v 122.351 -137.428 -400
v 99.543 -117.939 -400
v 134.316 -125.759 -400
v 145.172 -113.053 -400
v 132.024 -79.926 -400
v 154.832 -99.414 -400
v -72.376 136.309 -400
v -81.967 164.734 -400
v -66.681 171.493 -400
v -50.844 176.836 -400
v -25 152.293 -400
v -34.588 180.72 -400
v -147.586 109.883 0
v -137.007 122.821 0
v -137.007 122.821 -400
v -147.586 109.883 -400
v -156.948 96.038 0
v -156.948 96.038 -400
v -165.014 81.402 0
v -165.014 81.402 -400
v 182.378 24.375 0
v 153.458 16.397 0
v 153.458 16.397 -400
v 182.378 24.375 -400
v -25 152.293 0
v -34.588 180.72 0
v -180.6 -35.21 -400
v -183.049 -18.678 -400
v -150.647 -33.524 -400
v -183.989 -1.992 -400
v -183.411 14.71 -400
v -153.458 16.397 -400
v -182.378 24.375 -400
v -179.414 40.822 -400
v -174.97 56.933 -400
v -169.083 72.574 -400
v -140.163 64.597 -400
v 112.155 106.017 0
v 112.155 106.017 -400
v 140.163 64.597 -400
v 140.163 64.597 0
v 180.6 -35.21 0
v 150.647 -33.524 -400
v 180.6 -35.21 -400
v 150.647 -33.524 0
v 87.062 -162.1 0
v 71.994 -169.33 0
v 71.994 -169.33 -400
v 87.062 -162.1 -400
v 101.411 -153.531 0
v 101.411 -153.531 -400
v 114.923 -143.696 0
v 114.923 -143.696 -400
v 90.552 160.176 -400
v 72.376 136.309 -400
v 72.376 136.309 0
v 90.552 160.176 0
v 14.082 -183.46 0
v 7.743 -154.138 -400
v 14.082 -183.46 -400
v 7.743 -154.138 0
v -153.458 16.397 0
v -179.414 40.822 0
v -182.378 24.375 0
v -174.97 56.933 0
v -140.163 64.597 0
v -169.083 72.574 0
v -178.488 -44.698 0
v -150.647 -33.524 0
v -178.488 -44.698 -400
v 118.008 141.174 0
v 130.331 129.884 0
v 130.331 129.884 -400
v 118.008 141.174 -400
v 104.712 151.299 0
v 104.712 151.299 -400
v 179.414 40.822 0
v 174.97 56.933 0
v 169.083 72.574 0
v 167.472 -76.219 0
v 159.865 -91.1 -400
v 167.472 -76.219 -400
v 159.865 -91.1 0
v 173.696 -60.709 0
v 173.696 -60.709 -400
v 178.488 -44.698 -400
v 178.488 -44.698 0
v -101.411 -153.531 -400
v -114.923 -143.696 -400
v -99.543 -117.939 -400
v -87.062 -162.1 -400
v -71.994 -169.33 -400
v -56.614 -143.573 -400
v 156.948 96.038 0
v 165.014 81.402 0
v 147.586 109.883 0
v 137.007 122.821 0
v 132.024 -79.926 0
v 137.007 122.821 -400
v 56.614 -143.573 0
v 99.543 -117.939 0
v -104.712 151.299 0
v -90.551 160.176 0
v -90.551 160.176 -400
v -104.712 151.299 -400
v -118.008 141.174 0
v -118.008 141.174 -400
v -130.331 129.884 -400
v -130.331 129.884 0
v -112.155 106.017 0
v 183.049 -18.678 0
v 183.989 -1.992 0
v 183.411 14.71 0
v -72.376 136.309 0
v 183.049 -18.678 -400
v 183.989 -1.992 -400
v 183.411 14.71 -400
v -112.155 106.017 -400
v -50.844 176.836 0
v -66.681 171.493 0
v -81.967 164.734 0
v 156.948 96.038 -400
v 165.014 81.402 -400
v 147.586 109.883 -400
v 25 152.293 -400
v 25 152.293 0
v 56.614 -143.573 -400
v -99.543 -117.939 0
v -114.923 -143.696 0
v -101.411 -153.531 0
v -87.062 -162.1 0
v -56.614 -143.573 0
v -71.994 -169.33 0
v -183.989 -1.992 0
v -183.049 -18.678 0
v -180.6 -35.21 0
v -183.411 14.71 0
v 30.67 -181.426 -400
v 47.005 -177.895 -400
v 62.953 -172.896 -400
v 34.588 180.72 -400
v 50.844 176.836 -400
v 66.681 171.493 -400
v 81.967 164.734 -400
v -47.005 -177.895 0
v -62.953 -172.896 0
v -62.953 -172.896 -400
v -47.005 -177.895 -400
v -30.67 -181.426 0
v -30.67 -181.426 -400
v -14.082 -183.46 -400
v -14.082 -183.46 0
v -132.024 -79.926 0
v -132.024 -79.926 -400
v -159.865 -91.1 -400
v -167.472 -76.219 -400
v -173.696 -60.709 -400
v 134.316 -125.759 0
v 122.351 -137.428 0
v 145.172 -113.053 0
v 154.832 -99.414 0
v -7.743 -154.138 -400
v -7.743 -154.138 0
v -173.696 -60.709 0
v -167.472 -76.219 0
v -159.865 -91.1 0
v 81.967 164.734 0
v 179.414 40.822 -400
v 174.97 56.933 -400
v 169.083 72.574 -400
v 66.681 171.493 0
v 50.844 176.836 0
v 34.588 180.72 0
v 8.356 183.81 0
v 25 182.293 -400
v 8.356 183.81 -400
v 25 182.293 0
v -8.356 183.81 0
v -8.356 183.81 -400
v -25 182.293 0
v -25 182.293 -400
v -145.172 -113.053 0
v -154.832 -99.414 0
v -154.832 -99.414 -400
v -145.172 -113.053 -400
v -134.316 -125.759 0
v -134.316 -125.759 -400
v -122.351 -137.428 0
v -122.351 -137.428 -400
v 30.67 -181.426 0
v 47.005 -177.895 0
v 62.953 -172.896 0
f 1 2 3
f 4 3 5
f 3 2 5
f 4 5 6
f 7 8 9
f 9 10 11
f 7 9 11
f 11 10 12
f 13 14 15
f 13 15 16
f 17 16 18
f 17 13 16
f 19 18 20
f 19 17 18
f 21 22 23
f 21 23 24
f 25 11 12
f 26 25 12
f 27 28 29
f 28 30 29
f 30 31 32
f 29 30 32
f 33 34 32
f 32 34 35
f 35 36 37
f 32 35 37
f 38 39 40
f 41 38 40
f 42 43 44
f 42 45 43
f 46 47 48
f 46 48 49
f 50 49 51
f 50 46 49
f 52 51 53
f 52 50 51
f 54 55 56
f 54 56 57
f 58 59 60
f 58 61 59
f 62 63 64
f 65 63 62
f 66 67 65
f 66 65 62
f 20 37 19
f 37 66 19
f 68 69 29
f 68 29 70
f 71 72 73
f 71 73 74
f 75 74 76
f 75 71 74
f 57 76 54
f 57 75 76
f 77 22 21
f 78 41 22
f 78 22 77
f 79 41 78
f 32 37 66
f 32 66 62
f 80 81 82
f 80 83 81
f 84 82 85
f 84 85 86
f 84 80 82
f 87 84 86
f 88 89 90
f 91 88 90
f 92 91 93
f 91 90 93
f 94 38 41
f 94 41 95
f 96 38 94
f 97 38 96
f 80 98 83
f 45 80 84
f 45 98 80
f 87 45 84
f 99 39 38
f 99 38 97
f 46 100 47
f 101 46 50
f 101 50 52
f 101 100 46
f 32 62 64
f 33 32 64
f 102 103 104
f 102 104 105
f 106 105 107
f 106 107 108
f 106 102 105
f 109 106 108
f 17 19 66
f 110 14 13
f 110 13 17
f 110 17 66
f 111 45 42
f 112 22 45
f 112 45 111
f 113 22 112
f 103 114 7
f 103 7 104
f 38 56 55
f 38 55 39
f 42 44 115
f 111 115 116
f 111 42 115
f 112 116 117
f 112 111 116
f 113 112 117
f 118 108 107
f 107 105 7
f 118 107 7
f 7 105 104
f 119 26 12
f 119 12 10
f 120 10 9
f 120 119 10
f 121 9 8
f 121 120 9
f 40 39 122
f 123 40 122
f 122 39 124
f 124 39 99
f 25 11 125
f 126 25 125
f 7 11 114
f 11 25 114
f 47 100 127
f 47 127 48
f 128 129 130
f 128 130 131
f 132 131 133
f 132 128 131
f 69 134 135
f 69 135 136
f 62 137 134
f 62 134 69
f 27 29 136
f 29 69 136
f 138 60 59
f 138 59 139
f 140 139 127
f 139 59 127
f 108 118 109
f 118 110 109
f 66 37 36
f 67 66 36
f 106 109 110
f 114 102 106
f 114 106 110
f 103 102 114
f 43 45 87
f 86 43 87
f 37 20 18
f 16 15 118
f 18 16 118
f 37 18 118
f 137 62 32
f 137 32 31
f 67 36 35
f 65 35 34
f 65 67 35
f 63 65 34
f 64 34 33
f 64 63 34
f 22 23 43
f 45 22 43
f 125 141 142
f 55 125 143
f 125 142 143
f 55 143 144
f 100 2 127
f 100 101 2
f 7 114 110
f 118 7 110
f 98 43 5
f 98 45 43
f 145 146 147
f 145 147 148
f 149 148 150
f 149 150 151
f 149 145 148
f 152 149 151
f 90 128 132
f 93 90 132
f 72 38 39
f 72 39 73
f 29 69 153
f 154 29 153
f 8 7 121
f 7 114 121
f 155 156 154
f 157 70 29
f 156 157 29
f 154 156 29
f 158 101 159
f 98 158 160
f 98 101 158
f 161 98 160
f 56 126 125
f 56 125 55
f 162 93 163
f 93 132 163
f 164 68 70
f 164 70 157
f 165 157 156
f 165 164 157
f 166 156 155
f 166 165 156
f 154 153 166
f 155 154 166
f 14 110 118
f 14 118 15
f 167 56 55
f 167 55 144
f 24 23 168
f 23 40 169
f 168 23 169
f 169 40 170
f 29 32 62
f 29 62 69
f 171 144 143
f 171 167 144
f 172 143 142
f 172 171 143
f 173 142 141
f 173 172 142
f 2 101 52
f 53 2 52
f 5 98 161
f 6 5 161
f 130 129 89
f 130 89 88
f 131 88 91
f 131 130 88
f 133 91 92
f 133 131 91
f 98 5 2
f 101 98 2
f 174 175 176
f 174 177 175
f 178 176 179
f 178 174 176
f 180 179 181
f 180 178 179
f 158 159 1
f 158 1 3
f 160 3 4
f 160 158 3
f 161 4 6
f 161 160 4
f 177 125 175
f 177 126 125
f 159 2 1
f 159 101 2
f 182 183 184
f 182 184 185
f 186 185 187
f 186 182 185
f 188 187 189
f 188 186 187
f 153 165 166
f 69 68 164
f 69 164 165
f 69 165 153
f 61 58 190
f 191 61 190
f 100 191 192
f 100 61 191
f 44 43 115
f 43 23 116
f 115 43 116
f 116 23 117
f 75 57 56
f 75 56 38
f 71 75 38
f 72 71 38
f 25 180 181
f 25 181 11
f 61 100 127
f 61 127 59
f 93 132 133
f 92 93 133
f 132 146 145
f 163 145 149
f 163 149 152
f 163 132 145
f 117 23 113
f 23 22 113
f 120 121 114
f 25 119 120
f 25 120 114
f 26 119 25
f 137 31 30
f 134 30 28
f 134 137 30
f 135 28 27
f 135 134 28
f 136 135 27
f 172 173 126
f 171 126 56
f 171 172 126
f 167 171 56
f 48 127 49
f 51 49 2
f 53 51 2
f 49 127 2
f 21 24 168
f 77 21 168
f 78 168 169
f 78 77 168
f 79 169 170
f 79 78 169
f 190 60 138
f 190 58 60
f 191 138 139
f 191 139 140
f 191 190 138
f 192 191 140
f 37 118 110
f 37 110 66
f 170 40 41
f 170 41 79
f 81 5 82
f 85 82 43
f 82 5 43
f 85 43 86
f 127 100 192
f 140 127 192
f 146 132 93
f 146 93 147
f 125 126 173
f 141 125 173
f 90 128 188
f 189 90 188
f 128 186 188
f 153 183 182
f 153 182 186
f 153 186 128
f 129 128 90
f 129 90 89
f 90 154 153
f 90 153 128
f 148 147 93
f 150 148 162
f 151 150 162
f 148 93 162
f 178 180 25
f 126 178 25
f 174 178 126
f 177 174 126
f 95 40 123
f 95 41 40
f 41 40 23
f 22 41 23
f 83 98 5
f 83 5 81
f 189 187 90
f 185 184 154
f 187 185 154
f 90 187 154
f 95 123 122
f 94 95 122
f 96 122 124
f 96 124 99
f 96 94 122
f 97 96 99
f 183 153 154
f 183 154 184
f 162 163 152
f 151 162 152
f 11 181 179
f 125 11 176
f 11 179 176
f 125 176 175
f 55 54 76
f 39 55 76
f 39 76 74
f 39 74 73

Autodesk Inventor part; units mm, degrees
ref_plane "YZ Plane" through (0, 0, 0) normal (1, 0, 0) x (0, 1, 0)
ref_plane "XZ Plane" through (0, 0, 0) normal (0, 1, 0) x (-1, 0, 0)
ref_plane "XY Plane" through (0, 0, 0) normal (0, 0, 1) x (1, 0, 0)
sketch "Skizze1" plane through (0, 0, 0) normal (0, 0, 1) x (1, 0, 0)
  line L0 (-257.6, 0) -> (257.6, 0) projected
  line L1 (0, -257.6) -> (0, 257.6) projected
  circle A0 centre (0, 0) radius 184
  line L2 (-25, 182.2933) -> (-25, 152.2933)
  line L3 (-25, 152.2933) -> (25, 152.2933)
  line L4 (25, 152.2933) -> (25, 182.2933)
  arc A1 (25, 182.2933) -> (-25, 182.2933) centre (0, 0.0397) ccw
  dimension "d11" = 368
  dimension "d13" = 25
  dimension "d15" = 50
extrude "Extrusion1" add sketch "Skizze1" against normal blind 400 contours A0 L1 L3 L2 | L1 A0 L4 L3
sketch "Skizze2" plane through (0, 0, 0) normal (0, 0, 1) x (1, 0, 0)
  circle A0 centre (0, 0) radius 184
  arc A1 (25, 182.2933) -> (-25, 182.2933) centre (0, 0.0397) ccw projected
  line L0 (-25, 152.2933) -> (-25, 182.2933) projected
  arc A2 (25, 182.2933) -> (-25, 182.2933) centre (0, 0.0397) ccw
  line L1 (-25, 182.2933) -> (-25, 152.2933)
  line L2 (25, 152.2933) -> (-25, 152.2933) projected
  line L3 (25, 152.2933) -> (25, 182.2933)
  line L4 (-25, 152.2933) -> (-72.3761, 136.3088)
  line L5 (-72.3761, 136.3088) -> (-81.9668, 164.7345)
  line L6 (-25, 152.2933) -> (-34.5884, 180.7198)
  line L7 (25, 152.2933) -> (72.3761, 136.3088)
  line L8 (72.3761, 136.3088) -> (81.9668, 164.7345)
  line L9 (25, 152.2933) -> (34.5884, 180.7198)
  line L10 (72.3761, 136.3088) -> (112.1554, 106.0167)
  line L11 (112.1554, 106.0167) -> (130.3306, 129.8843)
  line L12 (72.3761, 136.3088) -> (90.5515, 160.1762)
  line L13 (-72.3761, 136.3088) -> (-112.1554, 106.0167)
  line L14 (-112.1554, 106.0167) -> (-130.3306, 129.8843)
  line L15 (-72.3761, 136.3088) -> (-90.5513, 160.1763)
  line L16 (-257.6, 0) -> (257.6, 0) projected
  line L17 (0, -257.6) -> (0, 257.6) projected
  line L18 (-112.1554, 106.0167) -> (-140.1627, 64.5971)
  line L19 (-140.1627, 64.5971) -> (-165.0145, 81.4015)
  line L20 (-112.1554, 106.0167) -> (-137.0072, 122.8212)
  line L21 (-140.1627, 64.5971) -> (-153.4585, 16.3973)
  line L22 (-153.4585, 16.3973) -> (-182.3784, 24.3747)
  line L23 (-140.1627, 64.5971) -> (-169.0826, 72.5745)
  line L24 (-153.4585, 16.3973) -> (-150.6471, -33.5236)
  line L25 (-150.6471, -33.5236) -> (-180.5996, -35.2105)
  line L26 (-153.4585, 16.3973) -> (-183.411, 14.7104)
  line L27 (-150.6471, -33.5236) -> (-132.0236, -79.9259)
  line L28 (-132.0236, -79.9259) -> (-159.8649, -91.0999)
  line L29 (-150.6471, -33.5236) -> (-178.4884, -44.6977)
  line L30 (-132.0236, -79.9259) -> (-99.5428, -117.939)
  line L31 (-99.5428, -117.939) -> (-122.3507, -137.4275)
  line L32 (-132.0236, -79.9259) -> (-154.8315, -99.4143)
  line L33 (-99.5428, -117.939) -> (-56.6139, -143.5731)
  line L34 (-56.6139, -143.5731) -> (-71.9944, -169.3305)
  line L35 (-99.5428, -117.939) -> (-114.9233, -143.6963)
  line L36 (-56.6139, -143.5731) -> (-7.7428, -154.1377)
  line L37 (-7.7428, -154.1377) -> (-14.0815, -183.4604)
  line L38 (-56.6139, -143.5731) -> (-62.9526, -172.8958)
  line L39 (112.1554, 106.0167) -> (140.1627, 64.5971)
  line L40 (140.1627, 64.5971) -> (165.0145, 81.4015)
  line L41 (112.1554, 106.0167) -> (137.0072, 122.8212)
  line L42 (140.1627, 64.5971) -> (153.4585, 16.3973)
  line L43 (153.4585, 16.3973) -> (182.3784, 24.3747)
  line L44 (140.1627, 64.5971) -> (169.0826, 72.5745)
  line L45 (153.4585, 16.3973) -> (150.6471, -33.5236)
  line L46 (150.6471, -33.5236) -> (180.5996, -35.2105)
  line L47 (153.4585, 16.3973) -> (183.411, 14.7104)
  line L48 (150.6471, -33.5236) -> (132.0236, -79.9259)
  line L49 (132.0236, -79.9259) -> (159.8649, -91.0999)
  line L50 (150.6471, -33.5236) -> (178.4884, -44.6977)
  line L51 (132.0236, -79.9259) -> (99.5428, -117.939)
  line L52 (99.5428, -117.939) -> (122.3507, -137.4275)
  line L53 (132.0236, -79.9259) -> (154.8315, -99.4143)
  line L54 (99.5428, -117.939) -> (56.6139, -143.5731)
  line L55 (56.6139, -143.5731) -> (71.9944, -169.3305)
  line L56 (99.5428, -117.939) -> (114.9233, -143.6963)
  line L57 (56.6139, -143.5731) -> (7.7428, -154.1377)
  line L58 (7.7428, -154.1377) -> (14.0815, -183.4604)
  line L59 (56.6139, -143.5731) -> (62.9526, -172.8958)
  dimension "d18" = 368
  dimension "d20" = 50
  dimension "d21" = 30
  dimension "d22" = 50
  dimension "d23" = 30
  dimension "d24" = 90
  dimension "d25" = 90.005
  dimension "d26" = 90.005
  dimension "d27" = 50
  dimension "d28" = 30
  dimension "d29" = 90
  dimension "d30" = 90
  dimension "d31" = 50
  dimension "d32" = 30
  dimension "d34" = 90
  dimension "d35" = 90
  dimension "d37" = 50
  dimension "d38" = 30
  dimension "d40" = 90
  dimension "d41" = 90
  dimension "d42" = 50
  dimension "d43" = 30
  dimension "d44" = 90
  dimension "d52" = 50
  dimension "d53" = 30
  dimension "d54" = 90
  dimension "d55" = 50
  dimension "d56" = 30
  dimension "d57" = 90
  dimension "d58" = 90
  dimension "d59" = 50
  dimension "d60" = 30
  dimension "d61" = 90
  dimension "d62" = 90
  dimension "d66" = 50
  dimension "d67" = 30
  dimension "d68" = 90
  dimension "d69" = 50
  dimension "d70" = 30
  dimension "d71" = 90
  dimension "d72" = 90
extrude "Extrusion2" add sketch "Skizze2" against normal blind 400 contours L16 L45 L47 A0 | A0 L46 L45 L16 | L43 L42 L44 A0 | A0 L49 L48 L50 | L39 L41 A0 L40 | L53 A0 L52 L51 | L24 L25 A0 L16 | L16 A0 L26 L24 | L10 L12 A0 L11 | L56 A0 L55 L54 | L22 A0 L23 L21 | L27 L28 A0 L29 | A0 L38 L36 L37 | L58 L57 L59 A0 | L9 A0 L8 L7 | L4 L5 A0 L6 | L19 A0 L20 L18 | L30 L31 A0 L32 | L13 L14 A0 L15 | L33 L34 A0 L35
sketch "Skizze3" plane through (0, 0, 0) normal (0, 0, 1) x (1, 0, 0)
  point P0 (0, 0)
properties part number "XPS"
